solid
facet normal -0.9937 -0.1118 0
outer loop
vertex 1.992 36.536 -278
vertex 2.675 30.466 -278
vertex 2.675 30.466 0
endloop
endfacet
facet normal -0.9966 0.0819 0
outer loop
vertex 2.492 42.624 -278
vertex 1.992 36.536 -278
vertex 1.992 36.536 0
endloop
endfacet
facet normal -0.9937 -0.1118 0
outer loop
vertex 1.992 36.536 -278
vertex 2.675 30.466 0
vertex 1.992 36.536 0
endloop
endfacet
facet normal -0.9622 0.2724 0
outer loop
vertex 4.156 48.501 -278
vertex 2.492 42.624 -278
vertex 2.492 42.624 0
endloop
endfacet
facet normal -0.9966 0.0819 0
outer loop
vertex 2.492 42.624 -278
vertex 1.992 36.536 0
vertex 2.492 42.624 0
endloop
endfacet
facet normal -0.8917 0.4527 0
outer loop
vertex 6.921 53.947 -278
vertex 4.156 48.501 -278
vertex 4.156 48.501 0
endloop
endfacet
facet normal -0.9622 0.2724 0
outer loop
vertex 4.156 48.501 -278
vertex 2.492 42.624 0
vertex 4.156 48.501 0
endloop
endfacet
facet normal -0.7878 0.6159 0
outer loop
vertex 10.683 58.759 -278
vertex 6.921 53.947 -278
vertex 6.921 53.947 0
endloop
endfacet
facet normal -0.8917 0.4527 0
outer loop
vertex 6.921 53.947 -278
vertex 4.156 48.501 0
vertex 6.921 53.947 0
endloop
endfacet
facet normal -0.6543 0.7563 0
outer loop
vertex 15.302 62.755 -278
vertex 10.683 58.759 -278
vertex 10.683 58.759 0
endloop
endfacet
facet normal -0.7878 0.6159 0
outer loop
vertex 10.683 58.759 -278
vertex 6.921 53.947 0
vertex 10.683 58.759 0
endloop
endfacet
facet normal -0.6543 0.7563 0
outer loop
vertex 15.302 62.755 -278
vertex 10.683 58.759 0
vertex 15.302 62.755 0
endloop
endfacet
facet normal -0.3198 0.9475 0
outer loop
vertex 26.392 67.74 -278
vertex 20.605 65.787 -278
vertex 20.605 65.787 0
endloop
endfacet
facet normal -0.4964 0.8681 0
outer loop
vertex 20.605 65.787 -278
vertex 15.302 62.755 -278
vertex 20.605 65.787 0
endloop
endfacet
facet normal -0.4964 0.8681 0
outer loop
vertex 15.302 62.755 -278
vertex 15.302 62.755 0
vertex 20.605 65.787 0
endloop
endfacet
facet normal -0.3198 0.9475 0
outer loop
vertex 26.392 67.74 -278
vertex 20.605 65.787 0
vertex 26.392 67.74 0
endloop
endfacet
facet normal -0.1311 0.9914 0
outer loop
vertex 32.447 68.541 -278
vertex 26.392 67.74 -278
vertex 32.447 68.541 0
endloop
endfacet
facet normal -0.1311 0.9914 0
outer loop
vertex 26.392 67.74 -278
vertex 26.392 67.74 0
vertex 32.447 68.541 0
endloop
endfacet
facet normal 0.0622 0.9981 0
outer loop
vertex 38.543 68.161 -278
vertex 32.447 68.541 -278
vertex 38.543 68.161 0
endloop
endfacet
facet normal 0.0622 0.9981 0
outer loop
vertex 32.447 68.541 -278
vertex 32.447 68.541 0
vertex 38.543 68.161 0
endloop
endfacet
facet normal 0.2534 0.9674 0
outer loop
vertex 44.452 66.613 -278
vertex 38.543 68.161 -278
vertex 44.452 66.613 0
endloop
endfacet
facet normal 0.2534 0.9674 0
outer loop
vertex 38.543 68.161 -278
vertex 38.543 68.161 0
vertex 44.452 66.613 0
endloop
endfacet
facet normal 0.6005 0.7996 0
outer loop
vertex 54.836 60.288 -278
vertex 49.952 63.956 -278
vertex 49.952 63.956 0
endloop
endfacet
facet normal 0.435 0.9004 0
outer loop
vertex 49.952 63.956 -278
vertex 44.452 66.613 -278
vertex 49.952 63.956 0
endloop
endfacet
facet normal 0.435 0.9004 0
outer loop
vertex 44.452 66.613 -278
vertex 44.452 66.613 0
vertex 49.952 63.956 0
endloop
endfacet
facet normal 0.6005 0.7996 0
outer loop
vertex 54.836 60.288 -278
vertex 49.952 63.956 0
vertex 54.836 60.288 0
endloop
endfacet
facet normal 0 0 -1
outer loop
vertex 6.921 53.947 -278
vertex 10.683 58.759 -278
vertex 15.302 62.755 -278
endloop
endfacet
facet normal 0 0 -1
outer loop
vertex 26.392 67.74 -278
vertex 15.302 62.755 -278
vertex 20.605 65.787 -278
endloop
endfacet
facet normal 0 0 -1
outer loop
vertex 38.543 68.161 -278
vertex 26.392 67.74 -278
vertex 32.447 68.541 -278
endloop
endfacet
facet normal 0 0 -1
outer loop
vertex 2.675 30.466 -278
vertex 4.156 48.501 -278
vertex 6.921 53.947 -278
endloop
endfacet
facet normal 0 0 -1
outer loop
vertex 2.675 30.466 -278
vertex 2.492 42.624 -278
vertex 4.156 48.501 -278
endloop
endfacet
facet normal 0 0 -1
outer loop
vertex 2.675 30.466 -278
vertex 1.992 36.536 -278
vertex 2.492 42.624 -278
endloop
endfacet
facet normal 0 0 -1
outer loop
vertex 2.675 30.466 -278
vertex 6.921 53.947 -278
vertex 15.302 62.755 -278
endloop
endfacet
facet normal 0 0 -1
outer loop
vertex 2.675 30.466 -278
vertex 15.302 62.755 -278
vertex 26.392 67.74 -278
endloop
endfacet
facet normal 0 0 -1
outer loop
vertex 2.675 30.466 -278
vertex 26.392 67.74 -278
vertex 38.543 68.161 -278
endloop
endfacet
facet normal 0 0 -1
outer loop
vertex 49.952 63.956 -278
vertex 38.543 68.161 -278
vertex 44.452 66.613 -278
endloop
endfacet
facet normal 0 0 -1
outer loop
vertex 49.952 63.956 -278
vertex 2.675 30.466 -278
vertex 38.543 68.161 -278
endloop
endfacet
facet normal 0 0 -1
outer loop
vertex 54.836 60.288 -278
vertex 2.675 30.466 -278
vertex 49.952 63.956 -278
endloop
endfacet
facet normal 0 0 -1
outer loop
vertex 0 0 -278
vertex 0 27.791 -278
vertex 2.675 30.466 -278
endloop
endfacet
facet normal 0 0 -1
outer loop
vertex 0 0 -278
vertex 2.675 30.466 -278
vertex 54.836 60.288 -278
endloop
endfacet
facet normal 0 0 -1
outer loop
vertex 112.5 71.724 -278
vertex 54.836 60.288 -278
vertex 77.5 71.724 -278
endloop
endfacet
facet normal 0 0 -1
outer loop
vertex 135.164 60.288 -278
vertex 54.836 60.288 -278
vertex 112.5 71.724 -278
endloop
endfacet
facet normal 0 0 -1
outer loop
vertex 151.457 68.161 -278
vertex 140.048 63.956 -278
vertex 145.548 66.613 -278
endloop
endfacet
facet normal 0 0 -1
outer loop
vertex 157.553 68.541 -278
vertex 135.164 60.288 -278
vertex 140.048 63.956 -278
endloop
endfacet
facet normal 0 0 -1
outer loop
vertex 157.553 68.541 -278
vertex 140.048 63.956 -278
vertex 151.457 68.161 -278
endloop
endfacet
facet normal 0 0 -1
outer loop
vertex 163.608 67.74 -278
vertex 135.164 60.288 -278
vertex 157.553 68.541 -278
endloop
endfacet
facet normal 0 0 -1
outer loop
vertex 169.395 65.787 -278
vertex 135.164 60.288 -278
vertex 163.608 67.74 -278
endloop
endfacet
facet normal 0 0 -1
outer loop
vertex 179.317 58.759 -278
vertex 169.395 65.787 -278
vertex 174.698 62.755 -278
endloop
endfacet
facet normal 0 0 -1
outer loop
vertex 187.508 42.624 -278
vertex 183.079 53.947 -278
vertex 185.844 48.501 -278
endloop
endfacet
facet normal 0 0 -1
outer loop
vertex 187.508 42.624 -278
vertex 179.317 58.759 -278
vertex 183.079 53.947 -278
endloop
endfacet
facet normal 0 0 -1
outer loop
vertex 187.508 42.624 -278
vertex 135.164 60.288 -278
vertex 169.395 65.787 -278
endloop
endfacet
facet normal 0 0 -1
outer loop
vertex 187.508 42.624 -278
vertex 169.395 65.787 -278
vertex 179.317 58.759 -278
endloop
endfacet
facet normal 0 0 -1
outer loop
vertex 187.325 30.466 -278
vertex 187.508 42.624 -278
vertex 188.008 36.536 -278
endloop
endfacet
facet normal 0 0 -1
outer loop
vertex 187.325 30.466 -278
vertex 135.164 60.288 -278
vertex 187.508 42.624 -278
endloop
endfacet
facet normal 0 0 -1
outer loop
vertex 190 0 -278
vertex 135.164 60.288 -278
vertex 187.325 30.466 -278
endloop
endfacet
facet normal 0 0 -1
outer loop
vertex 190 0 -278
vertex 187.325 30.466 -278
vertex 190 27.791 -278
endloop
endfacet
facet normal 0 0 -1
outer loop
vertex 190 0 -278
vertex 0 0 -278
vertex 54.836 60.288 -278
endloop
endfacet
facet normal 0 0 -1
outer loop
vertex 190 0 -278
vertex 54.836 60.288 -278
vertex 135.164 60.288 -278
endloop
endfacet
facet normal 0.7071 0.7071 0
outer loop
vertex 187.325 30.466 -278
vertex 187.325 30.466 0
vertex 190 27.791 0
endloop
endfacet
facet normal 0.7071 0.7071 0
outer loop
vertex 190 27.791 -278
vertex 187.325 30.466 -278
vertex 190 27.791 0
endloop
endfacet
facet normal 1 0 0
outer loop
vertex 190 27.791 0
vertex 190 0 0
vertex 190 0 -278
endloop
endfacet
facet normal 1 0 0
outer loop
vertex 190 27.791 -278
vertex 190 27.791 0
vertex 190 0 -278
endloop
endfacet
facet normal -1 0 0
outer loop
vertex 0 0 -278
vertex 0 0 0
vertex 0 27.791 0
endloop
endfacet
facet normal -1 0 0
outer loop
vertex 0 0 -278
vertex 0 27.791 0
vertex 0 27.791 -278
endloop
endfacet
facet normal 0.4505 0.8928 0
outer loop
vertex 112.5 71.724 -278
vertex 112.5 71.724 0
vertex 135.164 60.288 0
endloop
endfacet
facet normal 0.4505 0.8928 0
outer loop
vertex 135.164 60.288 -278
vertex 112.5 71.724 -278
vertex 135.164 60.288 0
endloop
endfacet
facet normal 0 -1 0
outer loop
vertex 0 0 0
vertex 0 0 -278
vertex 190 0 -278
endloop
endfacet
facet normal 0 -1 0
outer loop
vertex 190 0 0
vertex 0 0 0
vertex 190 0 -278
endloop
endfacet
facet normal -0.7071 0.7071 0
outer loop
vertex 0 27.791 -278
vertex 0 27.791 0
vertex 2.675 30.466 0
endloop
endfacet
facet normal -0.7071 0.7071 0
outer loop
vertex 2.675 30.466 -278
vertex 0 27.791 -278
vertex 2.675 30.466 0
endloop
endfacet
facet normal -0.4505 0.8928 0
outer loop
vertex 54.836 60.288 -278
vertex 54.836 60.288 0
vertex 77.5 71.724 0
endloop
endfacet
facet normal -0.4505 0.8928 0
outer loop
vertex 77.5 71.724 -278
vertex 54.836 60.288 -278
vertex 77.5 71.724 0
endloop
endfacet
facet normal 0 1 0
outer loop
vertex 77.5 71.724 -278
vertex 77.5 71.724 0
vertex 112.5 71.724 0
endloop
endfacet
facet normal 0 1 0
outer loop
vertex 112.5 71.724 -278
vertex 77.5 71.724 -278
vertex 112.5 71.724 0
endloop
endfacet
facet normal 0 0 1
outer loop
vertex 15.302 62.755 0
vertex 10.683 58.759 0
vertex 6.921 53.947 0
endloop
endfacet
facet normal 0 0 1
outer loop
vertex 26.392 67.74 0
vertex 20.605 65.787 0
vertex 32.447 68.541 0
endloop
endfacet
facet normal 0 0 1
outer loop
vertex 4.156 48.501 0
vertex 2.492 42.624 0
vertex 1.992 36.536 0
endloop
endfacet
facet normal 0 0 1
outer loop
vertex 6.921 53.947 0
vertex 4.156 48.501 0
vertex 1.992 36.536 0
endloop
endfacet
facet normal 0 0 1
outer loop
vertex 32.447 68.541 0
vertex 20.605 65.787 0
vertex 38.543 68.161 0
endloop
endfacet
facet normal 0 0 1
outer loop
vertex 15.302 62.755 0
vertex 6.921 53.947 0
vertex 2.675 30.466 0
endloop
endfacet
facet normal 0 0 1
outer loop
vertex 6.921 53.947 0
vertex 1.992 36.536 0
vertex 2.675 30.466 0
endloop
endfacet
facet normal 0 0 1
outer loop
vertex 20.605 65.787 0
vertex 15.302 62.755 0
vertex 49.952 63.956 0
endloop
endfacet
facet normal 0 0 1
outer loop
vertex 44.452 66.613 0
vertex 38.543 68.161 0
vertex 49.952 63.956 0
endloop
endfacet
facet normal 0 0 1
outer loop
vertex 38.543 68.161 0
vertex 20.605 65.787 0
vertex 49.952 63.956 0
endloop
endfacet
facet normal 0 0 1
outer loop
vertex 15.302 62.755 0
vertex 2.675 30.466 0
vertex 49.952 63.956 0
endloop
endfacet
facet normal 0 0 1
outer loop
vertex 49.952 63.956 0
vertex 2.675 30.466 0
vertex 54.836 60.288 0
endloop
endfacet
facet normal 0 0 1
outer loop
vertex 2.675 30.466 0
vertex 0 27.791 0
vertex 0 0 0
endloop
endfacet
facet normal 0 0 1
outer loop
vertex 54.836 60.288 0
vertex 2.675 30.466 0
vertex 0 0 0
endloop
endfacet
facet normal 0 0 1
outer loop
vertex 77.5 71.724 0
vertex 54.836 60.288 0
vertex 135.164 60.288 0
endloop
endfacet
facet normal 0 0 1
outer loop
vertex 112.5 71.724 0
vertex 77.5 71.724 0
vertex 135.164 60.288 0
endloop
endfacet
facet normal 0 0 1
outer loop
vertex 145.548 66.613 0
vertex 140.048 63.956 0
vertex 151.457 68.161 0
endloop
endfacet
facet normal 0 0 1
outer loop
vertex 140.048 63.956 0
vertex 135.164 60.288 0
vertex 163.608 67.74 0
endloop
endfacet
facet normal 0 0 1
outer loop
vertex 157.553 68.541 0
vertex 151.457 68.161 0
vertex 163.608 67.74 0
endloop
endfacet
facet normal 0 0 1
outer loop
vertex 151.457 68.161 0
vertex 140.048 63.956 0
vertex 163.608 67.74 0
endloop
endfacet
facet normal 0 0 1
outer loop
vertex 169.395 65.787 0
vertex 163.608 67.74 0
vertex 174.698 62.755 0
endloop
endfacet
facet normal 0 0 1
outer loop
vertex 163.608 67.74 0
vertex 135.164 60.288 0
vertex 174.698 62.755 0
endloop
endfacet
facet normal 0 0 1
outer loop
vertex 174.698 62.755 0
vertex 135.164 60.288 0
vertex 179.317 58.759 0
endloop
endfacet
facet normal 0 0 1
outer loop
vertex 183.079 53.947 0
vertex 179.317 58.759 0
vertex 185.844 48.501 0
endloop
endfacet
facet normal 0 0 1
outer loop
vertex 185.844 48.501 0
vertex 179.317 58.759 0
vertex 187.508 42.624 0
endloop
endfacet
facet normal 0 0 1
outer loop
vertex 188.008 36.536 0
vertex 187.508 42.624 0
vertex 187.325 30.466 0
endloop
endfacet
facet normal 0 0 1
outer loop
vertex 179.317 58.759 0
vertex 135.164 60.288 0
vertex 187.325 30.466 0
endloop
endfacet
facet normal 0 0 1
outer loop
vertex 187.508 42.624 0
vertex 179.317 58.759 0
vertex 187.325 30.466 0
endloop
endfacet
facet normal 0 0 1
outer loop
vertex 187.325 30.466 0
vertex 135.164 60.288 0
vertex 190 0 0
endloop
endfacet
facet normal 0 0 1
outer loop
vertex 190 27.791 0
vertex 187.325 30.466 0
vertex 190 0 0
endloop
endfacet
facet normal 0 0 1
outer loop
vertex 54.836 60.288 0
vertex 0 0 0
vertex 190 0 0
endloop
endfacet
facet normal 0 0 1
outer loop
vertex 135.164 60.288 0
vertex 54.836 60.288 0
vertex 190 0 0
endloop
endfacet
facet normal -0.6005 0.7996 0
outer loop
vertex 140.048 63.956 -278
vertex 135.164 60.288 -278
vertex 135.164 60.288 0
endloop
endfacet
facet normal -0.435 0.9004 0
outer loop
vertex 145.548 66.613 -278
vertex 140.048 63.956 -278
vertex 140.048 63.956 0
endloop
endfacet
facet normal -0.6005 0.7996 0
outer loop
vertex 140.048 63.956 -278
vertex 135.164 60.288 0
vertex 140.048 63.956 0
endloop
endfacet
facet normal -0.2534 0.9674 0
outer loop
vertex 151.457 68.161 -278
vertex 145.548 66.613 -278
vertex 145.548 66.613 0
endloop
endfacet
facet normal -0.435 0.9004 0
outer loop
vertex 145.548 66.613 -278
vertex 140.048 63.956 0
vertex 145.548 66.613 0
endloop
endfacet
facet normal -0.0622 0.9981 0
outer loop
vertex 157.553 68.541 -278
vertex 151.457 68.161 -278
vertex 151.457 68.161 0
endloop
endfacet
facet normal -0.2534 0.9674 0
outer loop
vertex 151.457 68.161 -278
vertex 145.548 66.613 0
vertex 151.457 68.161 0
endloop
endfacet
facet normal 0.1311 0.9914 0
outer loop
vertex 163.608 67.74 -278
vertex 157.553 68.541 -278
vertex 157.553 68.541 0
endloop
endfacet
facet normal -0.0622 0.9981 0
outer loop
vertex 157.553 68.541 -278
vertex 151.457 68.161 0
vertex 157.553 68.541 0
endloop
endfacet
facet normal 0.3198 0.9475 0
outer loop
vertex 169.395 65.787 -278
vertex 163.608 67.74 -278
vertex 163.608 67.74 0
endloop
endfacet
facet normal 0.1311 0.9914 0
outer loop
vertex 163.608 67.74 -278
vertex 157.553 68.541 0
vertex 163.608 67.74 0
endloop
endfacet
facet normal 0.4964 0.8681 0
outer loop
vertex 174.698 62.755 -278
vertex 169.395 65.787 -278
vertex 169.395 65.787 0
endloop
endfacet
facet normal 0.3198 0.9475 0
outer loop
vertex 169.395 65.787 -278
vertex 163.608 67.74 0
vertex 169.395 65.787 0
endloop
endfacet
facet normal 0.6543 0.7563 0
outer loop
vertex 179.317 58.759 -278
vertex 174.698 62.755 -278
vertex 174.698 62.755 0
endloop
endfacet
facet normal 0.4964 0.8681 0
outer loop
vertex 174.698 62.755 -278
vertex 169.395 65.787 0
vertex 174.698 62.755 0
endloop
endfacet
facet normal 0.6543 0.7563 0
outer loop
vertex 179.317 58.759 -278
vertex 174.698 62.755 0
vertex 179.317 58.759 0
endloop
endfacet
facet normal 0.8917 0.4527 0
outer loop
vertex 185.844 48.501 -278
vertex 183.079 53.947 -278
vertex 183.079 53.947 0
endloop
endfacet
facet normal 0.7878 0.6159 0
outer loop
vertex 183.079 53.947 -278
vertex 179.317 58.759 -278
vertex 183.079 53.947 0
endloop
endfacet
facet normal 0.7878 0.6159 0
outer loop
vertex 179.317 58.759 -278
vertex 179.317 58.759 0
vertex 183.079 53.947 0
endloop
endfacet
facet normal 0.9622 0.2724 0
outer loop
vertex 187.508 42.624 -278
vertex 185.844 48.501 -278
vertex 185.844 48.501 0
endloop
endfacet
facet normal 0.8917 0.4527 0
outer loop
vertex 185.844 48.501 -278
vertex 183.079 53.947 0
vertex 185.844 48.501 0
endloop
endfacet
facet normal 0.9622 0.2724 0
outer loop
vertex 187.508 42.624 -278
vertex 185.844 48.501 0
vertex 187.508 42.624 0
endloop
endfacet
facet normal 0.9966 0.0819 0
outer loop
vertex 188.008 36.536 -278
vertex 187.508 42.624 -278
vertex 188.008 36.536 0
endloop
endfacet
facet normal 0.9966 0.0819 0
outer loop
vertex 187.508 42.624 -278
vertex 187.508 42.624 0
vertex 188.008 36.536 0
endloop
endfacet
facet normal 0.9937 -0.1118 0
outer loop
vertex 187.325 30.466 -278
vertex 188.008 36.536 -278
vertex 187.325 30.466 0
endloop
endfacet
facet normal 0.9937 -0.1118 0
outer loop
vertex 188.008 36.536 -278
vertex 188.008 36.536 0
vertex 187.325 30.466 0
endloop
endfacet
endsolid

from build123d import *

# Parameters (mm, degrees)
SKETCH1_W           = 190
SKETCH1_H           = 278
BOSS_EXTRUDE1_DEPTH = 105
SKETCH3_OUTSIDE_W   = 262.544
SKETCH3_OUTSIDE_H   = 177.544
CUT_EXTRUDE1_DEPTH  = 353.71660012


with BuildPart() as part:
    # Sketch1 → Boss-Extrude1 (new body)
    with BuildSketch(Plane(origin=(0, 0, 0), x_dir=(1, 0, 0), z_dir=(0, 1, 0))):
        with Locations((95, 139)):
            Rectangle(SKETCH1_W, SKETCH1_H)
    extrude(amount=BOSS_EXTRUDE1_DEPTH)

    # Sketch3 outside → Cut-Extrude1 (cut, through all)
    with BuildSketch(Plane.XY):
        with Locations((95, 52.5)):
            Rectangle(SKETCH3_OUTSIDE_W, SKETCH3_OUTSIDE_H)
        with BuildLine():
            Line((54.836273007, 60.288293162), (77.499520746, 71.724132439))
            Line((77.499520746, 71.724132439), (112.500479254, 71.724132439))
            Line((112.500479254, 71.724132439), (135.163726993, 60.288293162))
            ThreePointArc((135.163726993, 60.288293162), (172.119968318, 64.39962656), (187.325162615, 30.466325783))
            Line((187.325162615, 30.466325783), (190, 27.791488398))
            Line((190, 27.791488398), (190, 0))
            Line((190, 0), (0, 0))
            Line((0, 0), (0, 27.791488398))
            Line((0, 27.791488398), (2.674837385, 30.466325783))
            ThreePointArc((2.674837385, 30.466325783), (17.880031682, 64.39962656), (54.836273007, 60.288293162))
        make_face(mode=Mode.SUBTRACT)
    extrude(amount=-CUT_EXTRUDE1_DEPTH, mode=Mode.SUBTRACT)


solid = part.part
